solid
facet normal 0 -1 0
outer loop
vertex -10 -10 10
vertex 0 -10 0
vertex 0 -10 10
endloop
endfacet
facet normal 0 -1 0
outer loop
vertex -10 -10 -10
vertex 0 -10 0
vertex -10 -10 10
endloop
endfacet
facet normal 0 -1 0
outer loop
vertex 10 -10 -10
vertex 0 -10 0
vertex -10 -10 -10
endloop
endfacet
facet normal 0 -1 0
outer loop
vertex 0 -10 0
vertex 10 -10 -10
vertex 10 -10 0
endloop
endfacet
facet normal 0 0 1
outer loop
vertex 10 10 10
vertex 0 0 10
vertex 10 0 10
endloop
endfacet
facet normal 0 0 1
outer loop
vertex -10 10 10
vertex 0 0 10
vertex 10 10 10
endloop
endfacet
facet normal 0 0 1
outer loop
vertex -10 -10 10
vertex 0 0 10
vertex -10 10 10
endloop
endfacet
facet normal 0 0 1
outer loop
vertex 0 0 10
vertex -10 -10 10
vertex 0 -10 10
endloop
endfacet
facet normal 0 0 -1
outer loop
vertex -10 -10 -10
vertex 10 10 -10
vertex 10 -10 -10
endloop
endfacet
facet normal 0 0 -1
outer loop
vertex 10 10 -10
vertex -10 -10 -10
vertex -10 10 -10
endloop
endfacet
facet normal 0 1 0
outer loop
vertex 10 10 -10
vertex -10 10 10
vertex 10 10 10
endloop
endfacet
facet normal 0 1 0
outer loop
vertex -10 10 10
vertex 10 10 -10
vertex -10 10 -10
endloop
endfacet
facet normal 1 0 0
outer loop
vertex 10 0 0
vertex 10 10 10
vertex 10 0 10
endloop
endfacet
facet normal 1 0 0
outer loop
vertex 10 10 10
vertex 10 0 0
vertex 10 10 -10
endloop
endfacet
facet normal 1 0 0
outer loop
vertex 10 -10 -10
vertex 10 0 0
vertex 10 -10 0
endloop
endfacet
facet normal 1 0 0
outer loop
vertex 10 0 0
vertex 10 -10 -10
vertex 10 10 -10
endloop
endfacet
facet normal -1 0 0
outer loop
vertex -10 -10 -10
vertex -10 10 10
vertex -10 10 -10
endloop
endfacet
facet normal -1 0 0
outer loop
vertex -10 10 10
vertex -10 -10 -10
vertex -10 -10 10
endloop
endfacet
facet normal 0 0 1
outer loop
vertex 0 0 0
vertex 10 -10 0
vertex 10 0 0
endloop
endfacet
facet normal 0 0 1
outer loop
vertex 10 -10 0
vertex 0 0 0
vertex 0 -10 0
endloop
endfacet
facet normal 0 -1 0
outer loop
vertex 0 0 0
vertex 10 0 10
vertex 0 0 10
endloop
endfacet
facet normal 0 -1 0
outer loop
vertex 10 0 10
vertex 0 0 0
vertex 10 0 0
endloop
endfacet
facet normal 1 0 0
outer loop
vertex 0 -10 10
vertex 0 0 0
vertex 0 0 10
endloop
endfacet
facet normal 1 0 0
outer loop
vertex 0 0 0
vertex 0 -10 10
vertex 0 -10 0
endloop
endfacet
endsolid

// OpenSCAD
rotate([0, 0, 270]) difference() {
  cube([20, 20, 20], center=true);
  cube([10, 10, 10]);
}
